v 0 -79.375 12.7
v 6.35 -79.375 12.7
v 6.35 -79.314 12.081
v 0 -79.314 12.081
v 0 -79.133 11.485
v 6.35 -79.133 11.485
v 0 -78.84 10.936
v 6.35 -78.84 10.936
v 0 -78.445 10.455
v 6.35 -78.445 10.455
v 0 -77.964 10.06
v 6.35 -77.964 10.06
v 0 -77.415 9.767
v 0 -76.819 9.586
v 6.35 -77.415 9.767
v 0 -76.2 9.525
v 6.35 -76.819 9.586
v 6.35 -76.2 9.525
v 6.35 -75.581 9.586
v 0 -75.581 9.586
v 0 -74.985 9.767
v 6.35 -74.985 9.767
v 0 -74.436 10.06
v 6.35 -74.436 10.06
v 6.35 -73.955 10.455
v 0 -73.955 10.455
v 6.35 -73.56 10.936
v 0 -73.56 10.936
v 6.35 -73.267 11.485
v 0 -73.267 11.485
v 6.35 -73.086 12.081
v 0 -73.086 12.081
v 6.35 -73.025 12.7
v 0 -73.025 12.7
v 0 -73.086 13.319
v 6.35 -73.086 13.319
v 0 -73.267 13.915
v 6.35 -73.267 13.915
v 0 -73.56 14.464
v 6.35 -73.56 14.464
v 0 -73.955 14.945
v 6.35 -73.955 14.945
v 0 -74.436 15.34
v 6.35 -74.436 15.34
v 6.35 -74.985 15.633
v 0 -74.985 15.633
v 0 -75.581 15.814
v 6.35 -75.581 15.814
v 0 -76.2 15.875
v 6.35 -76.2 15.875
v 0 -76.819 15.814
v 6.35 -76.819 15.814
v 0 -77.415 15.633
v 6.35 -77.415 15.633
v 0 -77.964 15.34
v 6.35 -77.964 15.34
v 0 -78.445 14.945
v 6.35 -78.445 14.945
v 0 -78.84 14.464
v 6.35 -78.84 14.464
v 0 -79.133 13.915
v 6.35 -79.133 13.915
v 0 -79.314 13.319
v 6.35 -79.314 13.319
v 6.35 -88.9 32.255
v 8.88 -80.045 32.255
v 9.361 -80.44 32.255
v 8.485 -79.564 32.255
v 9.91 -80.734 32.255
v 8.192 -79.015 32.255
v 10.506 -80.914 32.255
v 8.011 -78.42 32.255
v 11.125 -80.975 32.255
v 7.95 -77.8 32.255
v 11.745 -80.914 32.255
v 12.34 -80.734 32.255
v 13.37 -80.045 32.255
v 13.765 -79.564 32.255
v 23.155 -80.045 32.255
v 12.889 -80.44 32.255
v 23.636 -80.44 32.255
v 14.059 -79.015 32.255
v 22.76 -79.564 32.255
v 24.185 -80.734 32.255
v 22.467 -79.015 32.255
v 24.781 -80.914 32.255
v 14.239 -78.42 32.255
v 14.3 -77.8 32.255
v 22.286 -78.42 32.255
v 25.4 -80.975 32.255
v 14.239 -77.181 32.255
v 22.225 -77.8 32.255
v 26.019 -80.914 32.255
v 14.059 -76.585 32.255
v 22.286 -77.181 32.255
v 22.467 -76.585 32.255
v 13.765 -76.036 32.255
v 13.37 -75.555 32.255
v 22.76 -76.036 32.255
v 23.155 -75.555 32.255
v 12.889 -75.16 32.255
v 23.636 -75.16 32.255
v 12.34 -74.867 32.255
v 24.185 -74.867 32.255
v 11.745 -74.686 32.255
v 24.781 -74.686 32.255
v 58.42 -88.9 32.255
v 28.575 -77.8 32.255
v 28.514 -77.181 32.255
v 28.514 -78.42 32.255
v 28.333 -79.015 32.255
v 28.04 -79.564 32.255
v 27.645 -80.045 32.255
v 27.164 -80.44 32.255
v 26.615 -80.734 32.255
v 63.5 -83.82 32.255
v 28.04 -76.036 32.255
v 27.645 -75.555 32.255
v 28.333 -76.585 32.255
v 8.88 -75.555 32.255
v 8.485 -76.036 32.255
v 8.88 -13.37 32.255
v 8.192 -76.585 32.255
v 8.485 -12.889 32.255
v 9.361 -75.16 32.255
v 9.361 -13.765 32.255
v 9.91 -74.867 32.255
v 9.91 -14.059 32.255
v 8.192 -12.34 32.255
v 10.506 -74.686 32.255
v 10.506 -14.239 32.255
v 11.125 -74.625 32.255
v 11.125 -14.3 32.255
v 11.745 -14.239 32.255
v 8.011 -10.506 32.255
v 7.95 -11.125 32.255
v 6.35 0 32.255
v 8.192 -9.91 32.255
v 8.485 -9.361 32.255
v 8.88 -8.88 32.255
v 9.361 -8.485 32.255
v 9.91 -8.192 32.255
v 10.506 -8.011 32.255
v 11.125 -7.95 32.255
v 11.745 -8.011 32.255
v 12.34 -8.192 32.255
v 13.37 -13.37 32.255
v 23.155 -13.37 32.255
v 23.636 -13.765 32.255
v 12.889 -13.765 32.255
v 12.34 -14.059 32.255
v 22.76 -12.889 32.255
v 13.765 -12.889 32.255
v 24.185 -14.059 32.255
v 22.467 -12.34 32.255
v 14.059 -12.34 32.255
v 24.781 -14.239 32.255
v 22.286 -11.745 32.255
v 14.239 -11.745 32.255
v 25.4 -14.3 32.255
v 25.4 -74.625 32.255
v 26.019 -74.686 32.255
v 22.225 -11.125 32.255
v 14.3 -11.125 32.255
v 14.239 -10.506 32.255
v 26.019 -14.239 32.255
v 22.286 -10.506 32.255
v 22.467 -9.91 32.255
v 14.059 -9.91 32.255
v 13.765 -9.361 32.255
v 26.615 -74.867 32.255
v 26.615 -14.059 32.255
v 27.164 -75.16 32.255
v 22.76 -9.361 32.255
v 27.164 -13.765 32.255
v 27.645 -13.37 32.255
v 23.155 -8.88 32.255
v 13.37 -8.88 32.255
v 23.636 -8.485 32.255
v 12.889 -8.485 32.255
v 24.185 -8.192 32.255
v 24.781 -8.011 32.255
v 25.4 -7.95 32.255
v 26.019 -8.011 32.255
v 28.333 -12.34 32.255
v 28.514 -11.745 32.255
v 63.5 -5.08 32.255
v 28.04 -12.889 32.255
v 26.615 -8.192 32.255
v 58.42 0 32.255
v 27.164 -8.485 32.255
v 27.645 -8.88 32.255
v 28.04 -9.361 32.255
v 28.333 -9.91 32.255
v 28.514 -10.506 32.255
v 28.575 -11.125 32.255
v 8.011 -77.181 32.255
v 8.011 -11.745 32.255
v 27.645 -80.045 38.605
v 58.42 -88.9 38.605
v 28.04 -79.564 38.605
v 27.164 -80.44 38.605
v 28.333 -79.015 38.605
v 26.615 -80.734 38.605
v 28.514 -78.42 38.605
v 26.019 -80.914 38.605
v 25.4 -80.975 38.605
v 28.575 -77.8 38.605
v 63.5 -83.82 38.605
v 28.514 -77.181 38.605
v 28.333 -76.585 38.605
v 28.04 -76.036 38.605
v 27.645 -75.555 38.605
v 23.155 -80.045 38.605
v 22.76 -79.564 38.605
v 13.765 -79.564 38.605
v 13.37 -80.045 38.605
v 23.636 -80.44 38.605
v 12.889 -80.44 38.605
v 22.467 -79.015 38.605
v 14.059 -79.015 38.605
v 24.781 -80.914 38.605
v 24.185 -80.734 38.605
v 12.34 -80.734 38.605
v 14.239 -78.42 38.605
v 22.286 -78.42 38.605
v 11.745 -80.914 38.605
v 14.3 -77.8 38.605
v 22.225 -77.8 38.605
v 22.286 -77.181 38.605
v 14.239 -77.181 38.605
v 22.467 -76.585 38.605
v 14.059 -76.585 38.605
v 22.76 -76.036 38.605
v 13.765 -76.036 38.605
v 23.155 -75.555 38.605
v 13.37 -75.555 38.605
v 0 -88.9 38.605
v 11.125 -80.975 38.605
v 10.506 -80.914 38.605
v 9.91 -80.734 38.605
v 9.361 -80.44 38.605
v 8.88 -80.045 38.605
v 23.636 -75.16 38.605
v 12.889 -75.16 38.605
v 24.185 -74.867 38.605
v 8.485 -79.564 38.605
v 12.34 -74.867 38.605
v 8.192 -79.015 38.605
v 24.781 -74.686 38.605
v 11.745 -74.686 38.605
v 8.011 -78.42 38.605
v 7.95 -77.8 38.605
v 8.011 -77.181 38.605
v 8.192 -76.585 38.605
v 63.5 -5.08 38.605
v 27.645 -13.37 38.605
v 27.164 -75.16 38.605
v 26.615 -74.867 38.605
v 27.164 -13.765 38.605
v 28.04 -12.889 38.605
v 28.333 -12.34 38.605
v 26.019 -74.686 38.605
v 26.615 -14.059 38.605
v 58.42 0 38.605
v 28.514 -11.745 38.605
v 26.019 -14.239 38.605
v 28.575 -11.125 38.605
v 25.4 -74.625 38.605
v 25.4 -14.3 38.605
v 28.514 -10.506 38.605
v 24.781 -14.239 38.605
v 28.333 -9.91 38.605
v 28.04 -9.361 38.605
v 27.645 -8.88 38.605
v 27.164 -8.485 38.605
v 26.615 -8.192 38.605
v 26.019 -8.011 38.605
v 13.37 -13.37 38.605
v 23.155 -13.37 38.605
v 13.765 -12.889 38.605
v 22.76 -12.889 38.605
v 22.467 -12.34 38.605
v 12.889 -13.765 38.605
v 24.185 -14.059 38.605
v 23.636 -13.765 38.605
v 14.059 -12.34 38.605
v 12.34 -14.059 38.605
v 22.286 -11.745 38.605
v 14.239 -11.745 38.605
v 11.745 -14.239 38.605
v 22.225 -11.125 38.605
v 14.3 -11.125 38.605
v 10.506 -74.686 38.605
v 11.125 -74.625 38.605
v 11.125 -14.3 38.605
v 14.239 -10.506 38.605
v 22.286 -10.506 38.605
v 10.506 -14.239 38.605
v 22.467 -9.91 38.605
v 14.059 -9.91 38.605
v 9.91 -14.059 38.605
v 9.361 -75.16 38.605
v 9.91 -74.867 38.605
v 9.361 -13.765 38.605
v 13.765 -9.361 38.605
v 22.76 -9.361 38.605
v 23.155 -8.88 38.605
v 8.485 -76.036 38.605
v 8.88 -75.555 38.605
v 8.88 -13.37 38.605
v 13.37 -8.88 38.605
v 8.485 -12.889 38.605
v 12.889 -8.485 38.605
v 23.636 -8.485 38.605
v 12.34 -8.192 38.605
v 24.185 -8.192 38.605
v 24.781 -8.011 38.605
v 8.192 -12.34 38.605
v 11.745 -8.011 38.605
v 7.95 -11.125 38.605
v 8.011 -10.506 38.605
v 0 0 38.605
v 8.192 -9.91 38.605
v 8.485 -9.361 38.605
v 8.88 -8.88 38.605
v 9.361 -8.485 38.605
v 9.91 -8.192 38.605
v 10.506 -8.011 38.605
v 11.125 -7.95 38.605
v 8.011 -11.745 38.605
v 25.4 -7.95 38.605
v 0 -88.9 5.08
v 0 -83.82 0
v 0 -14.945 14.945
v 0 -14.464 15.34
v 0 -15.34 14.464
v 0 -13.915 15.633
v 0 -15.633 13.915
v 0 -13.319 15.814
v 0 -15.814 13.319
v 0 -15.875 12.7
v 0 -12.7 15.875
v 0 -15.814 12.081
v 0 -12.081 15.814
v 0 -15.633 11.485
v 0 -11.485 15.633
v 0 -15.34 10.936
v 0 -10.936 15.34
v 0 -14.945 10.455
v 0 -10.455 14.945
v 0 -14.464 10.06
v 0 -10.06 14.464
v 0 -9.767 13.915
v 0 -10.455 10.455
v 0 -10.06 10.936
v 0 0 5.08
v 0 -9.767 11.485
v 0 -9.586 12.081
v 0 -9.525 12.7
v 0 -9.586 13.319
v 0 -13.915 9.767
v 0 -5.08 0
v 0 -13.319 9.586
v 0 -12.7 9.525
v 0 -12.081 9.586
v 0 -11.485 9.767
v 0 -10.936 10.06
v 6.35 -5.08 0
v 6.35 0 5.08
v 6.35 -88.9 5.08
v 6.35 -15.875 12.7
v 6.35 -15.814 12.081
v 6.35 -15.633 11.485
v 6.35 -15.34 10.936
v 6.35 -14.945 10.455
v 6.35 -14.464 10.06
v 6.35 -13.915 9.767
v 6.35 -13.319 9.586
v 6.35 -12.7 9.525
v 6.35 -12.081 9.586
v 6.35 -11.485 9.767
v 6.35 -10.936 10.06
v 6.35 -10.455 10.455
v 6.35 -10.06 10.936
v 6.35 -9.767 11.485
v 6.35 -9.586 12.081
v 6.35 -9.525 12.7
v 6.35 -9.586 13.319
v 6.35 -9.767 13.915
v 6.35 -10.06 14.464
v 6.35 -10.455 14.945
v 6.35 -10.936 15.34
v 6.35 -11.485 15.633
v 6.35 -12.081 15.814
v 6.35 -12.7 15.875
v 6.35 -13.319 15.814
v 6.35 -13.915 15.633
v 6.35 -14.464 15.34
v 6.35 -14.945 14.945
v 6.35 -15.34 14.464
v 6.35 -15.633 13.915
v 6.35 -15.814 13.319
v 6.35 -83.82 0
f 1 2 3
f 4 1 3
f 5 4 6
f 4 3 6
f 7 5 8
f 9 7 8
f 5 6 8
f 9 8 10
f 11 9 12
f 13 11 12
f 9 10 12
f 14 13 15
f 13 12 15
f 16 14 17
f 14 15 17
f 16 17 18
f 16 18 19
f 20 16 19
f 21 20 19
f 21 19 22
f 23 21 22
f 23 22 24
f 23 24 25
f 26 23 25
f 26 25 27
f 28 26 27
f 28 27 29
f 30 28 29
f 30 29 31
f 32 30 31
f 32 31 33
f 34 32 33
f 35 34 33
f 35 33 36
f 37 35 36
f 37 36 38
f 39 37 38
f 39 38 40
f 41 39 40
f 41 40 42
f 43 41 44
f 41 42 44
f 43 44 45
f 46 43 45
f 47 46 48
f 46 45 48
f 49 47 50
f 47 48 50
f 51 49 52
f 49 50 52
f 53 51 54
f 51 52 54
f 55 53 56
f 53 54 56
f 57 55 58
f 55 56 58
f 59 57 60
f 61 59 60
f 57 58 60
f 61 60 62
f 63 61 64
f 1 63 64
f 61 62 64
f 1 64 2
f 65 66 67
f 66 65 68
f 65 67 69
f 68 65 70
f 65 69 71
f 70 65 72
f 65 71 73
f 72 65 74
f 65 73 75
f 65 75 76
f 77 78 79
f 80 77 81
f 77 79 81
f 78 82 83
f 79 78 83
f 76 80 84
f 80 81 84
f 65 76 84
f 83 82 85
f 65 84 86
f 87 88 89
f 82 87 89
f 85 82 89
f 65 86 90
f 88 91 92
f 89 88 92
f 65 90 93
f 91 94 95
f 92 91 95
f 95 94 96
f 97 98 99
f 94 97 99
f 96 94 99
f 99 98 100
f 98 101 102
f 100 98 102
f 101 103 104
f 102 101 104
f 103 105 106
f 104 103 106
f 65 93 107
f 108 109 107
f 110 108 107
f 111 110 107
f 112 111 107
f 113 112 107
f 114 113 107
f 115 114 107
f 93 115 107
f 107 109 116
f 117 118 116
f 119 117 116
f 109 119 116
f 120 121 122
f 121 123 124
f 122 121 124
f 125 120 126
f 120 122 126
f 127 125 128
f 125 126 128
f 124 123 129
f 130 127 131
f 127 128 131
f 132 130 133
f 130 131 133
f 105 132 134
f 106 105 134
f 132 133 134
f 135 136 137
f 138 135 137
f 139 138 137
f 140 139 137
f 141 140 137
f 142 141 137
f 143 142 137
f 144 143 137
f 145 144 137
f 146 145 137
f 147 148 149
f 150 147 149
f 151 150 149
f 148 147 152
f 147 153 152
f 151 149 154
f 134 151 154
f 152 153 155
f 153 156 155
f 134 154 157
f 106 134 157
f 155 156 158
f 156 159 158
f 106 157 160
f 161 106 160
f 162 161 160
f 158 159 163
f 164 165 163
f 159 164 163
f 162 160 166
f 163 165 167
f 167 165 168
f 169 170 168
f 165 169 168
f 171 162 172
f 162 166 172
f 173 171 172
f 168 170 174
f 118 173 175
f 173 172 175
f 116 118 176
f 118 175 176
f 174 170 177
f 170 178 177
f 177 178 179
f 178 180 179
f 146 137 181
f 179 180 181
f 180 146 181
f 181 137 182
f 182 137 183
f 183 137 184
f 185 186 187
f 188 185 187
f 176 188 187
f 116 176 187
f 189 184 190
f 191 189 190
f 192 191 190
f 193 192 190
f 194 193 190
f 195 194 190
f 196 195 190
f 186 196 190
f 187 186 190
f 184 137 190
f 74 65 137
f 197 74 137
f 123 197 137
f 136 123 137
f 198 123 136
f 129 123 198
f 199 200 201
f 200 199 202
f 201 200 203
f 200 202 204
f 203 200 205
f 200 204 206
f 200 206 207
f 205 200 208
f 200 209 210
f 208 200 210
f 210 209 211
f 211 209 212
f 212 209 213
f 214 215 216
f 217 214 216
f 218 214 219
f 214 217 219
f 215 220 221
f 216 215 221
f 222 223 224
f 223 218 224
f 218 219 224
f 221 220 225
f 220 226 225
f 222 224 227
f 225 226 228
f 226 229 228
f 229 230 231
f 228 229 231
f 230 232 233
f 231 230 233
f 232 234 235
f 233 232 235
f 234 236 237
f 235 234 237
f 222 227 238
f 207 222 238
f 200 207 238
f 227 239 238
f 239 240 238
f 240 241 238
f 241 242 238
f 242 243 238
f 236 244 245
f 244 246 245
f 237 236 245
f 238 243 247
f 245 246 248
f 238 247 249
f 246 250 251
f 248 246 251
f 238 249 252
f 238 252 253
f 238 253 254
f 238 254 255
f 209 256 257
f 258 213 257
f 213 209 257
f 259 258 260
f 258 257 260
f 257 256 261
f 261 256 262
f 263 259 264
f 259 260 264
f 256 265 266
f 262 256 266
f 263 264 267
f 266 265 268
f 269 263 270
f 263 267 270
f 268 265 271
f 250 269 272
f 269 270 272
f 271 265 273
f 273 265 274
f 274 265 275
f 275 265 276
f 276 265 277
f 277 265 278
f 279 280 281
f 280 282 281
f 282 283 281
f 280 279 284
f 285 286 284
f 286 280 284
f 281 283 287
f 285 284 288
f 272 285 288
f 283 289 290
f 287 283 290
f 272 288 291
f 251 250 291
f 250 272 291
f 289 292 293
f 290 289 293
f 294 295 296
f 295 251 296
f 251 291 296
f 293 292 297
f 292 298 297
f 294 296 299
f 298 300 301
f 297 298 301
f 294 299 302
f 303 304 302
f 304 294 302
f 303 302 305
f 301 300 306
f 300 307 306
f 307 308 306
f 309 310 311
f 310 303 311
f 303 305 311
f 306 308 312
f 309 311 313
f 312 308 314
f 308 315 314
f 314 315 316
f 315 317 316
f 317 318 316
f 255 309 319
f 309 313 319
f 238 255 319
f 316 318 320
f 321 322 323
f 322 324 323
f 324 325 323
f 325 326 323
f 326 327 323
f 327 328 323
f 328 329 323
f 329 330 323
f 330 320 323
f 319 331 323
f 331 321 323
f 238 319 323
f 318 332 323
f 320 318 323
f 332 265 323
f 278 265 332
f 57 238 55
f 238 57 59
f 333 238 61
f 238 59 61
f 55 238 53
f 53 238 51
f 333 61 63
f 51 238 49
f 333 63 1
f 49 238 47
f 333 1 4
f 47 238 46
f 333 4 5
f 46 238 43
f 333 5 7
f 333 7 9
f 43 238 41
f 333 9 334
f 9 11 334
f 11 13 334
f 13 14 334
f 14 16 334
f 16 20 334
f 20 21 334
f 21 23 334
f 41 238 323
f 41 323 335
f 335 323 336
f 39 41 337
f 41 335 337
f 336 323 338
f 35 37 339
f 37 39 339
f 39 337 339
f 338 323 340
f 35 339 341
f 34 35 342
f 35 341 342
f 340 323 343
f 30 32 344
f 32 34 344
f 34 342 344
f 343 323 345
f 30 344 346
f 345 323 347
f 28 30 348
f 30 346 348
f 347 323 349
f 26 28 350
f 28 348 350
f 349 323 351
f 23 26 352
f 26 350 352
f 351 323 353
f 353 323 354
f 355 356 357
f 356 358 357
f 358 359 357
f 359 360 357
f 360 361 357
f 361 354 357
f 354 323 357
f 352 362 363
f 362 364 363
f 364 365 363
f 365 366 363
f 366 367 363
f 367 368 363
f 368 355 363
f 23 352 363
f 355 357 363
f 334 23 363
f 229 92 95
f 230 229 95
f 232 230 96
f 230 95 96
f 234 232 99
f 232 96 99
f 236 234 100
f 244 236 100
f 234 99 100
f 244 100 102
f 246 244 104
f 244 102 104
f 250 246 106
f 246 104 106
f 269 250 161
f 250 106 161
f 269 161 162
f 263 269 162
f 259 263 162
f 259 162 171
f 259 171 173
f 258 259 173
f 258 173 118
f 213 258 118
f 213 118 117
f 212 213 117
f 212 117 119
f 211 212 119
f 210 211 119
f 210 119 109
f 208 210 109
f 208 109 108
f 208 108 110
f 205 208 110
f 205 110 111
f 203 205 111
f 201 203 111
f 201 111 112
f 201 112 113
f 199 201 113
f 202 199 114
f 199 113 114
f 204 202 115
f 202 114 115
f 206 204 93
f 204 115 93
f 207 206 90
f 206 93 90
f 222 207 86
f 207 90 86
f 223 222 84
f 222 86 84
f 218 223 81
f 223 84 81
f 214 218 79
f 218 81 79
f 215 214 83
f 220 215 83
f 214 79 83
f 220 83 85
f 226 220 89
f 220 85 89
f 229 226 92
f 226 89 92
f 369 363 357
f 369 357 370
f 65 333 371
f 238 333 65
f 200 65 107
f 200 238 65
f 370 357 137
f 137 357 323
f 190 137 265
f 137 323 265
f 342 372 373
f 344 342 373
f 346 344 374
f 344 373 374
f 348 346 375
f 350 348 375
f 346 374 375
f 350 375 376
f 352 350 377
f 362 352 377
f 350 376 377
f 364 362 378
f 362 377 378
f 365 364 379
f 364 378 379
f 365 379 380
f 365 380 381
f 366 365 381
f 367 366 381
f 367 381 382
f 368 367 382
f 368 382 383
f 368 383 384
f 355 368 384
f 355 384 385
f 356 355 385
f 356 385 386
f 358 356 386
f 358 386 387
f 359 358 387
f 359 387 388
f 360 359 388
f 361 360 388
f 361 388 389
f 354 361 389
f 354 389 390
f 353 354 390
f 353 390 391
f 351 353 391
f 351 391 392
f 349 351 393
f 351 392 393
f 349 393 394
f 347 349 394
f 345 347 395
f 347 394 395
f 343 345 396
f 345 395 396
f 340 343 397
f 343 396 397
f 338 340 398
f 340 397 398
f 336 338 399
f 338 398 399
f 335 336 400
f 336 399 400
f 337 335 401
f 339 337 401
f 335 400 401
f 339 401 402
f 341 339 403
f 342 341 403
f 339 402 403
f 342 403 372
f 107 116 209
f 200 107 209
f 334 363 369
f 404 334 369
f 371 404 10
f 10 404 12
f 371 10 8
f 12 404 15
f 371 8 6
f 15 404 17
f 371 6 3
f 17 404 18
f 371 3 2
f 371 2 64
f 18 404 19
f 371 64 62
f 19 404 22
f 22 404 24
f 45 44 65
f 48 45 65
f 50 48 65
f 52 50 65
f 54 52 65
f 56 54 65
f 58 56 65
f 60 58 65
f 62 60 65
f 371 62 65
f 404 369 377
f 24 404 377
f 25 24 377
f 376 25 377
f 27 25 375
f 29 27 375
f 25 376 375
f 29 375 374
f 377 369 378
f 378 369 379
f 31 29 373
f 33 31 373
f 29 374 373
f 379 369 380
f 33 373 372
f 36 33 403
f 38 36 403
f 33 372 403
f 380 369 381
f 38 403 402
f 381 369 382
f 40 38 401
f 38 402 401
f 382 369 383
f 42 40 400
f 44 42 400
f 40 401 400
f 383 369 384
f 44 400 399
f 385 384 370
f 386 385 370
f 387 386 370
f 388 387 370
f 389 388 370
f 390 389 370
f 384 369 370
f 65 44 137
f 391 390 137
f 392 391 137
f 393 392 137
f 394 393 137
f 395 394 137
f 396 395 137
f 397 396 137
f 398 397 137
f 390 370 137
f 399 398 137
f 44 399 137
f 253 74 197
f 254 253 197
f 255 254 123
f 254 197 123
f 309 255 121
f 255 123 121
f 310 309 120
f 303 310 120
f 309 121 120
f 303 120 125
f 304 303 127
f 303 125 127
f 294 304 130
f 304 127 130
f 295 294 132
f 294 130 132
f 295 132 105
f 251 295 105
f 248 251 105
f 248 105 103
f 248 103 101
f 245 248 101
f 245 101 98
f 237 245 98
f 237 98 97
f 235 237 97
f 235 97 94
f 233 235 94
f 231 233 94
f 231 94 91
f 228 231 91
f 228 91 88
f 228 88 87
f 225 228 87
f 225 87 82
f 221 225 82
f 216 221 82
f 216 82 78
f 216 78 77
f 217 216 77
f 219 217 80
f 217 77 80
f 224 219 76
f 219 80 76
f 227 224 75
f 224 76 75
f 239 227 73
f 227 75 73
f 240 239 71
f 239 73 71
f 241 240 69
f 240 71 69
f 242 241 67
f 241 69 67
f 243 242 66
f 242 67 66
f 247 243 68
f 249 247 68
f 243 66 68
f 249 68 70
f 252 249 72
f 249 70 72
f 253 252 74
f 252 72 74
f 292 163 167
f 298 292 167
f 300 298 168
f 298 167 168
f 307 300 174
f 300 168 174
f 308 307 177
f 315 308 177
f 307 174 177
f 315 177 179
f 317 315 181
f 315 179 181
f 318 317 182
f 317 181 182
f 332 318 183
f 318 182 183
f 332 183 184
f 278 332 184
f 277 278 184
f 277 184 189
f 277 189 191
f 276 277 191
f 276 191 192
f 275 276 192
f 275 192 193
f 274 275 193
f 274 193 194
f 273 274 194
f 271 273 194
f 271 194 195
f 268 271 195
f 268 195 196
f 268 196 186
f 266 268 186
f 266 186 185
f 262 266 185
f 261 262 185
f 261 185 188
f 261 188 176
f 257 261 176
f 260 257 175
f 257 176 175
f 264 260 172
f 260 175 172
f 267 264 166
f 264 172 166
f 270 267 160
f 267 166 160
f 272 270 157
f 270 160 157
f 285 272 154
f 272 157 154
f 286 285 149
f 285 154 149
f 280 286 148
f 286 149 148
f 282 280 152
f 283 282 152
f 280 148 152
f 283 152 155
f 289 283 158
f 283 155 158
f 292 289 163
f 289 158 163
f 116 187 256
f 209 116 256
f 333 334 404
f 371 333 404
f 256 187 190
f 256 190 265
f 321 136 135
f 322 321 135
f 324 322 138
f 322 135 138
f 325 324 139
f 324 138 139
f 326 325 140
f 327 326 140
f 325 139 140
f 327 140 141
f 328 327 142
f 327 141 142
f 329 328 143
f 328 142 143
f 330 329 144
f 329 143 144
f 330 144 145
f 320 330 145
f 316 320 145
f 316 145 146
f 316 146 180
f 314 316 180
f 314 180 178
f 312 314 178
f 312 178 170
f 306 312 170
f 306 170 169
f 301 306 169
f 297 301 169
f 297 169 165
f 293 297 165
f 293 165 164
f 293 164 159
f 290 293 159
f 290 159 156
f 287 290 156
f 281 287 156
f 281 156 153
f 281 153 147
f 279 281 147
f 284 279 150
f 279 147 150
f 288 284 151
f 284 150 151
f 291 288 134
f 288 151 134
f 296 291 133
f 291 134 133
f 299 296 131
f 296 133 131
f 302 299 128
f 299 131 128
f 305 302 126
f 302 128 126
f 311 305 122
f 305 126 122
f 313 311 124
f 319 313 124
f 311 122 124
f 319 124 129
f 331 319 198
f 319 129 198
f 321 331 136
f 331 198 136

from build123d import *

# Parameters (mm, degrees)
F1_DEPTH = 88.9
F3_D     = 6.35
F4_SIZE  = 5.08
F6_D     = 6.35


with BuildPart() as f1:
    # F0 (on Front) → F1 (new body)
    with BuildSketch(Plane.XZ):
        Polygon((0, 38.6051108942), (0, 0), (6.35, 0), (6.35, 32.2551108942), (63.5, 32.2551108942), (63.5, 38.6051108942), align=None)
    extrude(amount=F1_DEPTH)

    # F3 (through all)
    with Locations(Plane(origin=(0, 0, 0), x_dir=(0, 1, 0), z_dir=(-1, 0, 0))):
        with Locations((-76.2, -12.7), (-12.7, -12.7)):
            Hole(F3_D / 2)

    # F4
    f4_edges = [f1.edges().sort_by_distance(p)[0] for p in [
        (63.5, 0, 35.430111),
        (63.5, -88.9, 35.430111),
        (3.175, -88.9, 0),
        (3.175, 0, 0),
    ]]
    chamfer(f4_edges, length=F4_SIZE)

    # F6 (through all)
    with Locations(Plane.XY.offset(38.6051108942)):
        with Locations((25.4, -11.1252), (11.1252, -11.1252), (11.1252, -77.8002), (25.4, -77.8002)):
            Hole(F6_D / 2)


solid = f1.part
